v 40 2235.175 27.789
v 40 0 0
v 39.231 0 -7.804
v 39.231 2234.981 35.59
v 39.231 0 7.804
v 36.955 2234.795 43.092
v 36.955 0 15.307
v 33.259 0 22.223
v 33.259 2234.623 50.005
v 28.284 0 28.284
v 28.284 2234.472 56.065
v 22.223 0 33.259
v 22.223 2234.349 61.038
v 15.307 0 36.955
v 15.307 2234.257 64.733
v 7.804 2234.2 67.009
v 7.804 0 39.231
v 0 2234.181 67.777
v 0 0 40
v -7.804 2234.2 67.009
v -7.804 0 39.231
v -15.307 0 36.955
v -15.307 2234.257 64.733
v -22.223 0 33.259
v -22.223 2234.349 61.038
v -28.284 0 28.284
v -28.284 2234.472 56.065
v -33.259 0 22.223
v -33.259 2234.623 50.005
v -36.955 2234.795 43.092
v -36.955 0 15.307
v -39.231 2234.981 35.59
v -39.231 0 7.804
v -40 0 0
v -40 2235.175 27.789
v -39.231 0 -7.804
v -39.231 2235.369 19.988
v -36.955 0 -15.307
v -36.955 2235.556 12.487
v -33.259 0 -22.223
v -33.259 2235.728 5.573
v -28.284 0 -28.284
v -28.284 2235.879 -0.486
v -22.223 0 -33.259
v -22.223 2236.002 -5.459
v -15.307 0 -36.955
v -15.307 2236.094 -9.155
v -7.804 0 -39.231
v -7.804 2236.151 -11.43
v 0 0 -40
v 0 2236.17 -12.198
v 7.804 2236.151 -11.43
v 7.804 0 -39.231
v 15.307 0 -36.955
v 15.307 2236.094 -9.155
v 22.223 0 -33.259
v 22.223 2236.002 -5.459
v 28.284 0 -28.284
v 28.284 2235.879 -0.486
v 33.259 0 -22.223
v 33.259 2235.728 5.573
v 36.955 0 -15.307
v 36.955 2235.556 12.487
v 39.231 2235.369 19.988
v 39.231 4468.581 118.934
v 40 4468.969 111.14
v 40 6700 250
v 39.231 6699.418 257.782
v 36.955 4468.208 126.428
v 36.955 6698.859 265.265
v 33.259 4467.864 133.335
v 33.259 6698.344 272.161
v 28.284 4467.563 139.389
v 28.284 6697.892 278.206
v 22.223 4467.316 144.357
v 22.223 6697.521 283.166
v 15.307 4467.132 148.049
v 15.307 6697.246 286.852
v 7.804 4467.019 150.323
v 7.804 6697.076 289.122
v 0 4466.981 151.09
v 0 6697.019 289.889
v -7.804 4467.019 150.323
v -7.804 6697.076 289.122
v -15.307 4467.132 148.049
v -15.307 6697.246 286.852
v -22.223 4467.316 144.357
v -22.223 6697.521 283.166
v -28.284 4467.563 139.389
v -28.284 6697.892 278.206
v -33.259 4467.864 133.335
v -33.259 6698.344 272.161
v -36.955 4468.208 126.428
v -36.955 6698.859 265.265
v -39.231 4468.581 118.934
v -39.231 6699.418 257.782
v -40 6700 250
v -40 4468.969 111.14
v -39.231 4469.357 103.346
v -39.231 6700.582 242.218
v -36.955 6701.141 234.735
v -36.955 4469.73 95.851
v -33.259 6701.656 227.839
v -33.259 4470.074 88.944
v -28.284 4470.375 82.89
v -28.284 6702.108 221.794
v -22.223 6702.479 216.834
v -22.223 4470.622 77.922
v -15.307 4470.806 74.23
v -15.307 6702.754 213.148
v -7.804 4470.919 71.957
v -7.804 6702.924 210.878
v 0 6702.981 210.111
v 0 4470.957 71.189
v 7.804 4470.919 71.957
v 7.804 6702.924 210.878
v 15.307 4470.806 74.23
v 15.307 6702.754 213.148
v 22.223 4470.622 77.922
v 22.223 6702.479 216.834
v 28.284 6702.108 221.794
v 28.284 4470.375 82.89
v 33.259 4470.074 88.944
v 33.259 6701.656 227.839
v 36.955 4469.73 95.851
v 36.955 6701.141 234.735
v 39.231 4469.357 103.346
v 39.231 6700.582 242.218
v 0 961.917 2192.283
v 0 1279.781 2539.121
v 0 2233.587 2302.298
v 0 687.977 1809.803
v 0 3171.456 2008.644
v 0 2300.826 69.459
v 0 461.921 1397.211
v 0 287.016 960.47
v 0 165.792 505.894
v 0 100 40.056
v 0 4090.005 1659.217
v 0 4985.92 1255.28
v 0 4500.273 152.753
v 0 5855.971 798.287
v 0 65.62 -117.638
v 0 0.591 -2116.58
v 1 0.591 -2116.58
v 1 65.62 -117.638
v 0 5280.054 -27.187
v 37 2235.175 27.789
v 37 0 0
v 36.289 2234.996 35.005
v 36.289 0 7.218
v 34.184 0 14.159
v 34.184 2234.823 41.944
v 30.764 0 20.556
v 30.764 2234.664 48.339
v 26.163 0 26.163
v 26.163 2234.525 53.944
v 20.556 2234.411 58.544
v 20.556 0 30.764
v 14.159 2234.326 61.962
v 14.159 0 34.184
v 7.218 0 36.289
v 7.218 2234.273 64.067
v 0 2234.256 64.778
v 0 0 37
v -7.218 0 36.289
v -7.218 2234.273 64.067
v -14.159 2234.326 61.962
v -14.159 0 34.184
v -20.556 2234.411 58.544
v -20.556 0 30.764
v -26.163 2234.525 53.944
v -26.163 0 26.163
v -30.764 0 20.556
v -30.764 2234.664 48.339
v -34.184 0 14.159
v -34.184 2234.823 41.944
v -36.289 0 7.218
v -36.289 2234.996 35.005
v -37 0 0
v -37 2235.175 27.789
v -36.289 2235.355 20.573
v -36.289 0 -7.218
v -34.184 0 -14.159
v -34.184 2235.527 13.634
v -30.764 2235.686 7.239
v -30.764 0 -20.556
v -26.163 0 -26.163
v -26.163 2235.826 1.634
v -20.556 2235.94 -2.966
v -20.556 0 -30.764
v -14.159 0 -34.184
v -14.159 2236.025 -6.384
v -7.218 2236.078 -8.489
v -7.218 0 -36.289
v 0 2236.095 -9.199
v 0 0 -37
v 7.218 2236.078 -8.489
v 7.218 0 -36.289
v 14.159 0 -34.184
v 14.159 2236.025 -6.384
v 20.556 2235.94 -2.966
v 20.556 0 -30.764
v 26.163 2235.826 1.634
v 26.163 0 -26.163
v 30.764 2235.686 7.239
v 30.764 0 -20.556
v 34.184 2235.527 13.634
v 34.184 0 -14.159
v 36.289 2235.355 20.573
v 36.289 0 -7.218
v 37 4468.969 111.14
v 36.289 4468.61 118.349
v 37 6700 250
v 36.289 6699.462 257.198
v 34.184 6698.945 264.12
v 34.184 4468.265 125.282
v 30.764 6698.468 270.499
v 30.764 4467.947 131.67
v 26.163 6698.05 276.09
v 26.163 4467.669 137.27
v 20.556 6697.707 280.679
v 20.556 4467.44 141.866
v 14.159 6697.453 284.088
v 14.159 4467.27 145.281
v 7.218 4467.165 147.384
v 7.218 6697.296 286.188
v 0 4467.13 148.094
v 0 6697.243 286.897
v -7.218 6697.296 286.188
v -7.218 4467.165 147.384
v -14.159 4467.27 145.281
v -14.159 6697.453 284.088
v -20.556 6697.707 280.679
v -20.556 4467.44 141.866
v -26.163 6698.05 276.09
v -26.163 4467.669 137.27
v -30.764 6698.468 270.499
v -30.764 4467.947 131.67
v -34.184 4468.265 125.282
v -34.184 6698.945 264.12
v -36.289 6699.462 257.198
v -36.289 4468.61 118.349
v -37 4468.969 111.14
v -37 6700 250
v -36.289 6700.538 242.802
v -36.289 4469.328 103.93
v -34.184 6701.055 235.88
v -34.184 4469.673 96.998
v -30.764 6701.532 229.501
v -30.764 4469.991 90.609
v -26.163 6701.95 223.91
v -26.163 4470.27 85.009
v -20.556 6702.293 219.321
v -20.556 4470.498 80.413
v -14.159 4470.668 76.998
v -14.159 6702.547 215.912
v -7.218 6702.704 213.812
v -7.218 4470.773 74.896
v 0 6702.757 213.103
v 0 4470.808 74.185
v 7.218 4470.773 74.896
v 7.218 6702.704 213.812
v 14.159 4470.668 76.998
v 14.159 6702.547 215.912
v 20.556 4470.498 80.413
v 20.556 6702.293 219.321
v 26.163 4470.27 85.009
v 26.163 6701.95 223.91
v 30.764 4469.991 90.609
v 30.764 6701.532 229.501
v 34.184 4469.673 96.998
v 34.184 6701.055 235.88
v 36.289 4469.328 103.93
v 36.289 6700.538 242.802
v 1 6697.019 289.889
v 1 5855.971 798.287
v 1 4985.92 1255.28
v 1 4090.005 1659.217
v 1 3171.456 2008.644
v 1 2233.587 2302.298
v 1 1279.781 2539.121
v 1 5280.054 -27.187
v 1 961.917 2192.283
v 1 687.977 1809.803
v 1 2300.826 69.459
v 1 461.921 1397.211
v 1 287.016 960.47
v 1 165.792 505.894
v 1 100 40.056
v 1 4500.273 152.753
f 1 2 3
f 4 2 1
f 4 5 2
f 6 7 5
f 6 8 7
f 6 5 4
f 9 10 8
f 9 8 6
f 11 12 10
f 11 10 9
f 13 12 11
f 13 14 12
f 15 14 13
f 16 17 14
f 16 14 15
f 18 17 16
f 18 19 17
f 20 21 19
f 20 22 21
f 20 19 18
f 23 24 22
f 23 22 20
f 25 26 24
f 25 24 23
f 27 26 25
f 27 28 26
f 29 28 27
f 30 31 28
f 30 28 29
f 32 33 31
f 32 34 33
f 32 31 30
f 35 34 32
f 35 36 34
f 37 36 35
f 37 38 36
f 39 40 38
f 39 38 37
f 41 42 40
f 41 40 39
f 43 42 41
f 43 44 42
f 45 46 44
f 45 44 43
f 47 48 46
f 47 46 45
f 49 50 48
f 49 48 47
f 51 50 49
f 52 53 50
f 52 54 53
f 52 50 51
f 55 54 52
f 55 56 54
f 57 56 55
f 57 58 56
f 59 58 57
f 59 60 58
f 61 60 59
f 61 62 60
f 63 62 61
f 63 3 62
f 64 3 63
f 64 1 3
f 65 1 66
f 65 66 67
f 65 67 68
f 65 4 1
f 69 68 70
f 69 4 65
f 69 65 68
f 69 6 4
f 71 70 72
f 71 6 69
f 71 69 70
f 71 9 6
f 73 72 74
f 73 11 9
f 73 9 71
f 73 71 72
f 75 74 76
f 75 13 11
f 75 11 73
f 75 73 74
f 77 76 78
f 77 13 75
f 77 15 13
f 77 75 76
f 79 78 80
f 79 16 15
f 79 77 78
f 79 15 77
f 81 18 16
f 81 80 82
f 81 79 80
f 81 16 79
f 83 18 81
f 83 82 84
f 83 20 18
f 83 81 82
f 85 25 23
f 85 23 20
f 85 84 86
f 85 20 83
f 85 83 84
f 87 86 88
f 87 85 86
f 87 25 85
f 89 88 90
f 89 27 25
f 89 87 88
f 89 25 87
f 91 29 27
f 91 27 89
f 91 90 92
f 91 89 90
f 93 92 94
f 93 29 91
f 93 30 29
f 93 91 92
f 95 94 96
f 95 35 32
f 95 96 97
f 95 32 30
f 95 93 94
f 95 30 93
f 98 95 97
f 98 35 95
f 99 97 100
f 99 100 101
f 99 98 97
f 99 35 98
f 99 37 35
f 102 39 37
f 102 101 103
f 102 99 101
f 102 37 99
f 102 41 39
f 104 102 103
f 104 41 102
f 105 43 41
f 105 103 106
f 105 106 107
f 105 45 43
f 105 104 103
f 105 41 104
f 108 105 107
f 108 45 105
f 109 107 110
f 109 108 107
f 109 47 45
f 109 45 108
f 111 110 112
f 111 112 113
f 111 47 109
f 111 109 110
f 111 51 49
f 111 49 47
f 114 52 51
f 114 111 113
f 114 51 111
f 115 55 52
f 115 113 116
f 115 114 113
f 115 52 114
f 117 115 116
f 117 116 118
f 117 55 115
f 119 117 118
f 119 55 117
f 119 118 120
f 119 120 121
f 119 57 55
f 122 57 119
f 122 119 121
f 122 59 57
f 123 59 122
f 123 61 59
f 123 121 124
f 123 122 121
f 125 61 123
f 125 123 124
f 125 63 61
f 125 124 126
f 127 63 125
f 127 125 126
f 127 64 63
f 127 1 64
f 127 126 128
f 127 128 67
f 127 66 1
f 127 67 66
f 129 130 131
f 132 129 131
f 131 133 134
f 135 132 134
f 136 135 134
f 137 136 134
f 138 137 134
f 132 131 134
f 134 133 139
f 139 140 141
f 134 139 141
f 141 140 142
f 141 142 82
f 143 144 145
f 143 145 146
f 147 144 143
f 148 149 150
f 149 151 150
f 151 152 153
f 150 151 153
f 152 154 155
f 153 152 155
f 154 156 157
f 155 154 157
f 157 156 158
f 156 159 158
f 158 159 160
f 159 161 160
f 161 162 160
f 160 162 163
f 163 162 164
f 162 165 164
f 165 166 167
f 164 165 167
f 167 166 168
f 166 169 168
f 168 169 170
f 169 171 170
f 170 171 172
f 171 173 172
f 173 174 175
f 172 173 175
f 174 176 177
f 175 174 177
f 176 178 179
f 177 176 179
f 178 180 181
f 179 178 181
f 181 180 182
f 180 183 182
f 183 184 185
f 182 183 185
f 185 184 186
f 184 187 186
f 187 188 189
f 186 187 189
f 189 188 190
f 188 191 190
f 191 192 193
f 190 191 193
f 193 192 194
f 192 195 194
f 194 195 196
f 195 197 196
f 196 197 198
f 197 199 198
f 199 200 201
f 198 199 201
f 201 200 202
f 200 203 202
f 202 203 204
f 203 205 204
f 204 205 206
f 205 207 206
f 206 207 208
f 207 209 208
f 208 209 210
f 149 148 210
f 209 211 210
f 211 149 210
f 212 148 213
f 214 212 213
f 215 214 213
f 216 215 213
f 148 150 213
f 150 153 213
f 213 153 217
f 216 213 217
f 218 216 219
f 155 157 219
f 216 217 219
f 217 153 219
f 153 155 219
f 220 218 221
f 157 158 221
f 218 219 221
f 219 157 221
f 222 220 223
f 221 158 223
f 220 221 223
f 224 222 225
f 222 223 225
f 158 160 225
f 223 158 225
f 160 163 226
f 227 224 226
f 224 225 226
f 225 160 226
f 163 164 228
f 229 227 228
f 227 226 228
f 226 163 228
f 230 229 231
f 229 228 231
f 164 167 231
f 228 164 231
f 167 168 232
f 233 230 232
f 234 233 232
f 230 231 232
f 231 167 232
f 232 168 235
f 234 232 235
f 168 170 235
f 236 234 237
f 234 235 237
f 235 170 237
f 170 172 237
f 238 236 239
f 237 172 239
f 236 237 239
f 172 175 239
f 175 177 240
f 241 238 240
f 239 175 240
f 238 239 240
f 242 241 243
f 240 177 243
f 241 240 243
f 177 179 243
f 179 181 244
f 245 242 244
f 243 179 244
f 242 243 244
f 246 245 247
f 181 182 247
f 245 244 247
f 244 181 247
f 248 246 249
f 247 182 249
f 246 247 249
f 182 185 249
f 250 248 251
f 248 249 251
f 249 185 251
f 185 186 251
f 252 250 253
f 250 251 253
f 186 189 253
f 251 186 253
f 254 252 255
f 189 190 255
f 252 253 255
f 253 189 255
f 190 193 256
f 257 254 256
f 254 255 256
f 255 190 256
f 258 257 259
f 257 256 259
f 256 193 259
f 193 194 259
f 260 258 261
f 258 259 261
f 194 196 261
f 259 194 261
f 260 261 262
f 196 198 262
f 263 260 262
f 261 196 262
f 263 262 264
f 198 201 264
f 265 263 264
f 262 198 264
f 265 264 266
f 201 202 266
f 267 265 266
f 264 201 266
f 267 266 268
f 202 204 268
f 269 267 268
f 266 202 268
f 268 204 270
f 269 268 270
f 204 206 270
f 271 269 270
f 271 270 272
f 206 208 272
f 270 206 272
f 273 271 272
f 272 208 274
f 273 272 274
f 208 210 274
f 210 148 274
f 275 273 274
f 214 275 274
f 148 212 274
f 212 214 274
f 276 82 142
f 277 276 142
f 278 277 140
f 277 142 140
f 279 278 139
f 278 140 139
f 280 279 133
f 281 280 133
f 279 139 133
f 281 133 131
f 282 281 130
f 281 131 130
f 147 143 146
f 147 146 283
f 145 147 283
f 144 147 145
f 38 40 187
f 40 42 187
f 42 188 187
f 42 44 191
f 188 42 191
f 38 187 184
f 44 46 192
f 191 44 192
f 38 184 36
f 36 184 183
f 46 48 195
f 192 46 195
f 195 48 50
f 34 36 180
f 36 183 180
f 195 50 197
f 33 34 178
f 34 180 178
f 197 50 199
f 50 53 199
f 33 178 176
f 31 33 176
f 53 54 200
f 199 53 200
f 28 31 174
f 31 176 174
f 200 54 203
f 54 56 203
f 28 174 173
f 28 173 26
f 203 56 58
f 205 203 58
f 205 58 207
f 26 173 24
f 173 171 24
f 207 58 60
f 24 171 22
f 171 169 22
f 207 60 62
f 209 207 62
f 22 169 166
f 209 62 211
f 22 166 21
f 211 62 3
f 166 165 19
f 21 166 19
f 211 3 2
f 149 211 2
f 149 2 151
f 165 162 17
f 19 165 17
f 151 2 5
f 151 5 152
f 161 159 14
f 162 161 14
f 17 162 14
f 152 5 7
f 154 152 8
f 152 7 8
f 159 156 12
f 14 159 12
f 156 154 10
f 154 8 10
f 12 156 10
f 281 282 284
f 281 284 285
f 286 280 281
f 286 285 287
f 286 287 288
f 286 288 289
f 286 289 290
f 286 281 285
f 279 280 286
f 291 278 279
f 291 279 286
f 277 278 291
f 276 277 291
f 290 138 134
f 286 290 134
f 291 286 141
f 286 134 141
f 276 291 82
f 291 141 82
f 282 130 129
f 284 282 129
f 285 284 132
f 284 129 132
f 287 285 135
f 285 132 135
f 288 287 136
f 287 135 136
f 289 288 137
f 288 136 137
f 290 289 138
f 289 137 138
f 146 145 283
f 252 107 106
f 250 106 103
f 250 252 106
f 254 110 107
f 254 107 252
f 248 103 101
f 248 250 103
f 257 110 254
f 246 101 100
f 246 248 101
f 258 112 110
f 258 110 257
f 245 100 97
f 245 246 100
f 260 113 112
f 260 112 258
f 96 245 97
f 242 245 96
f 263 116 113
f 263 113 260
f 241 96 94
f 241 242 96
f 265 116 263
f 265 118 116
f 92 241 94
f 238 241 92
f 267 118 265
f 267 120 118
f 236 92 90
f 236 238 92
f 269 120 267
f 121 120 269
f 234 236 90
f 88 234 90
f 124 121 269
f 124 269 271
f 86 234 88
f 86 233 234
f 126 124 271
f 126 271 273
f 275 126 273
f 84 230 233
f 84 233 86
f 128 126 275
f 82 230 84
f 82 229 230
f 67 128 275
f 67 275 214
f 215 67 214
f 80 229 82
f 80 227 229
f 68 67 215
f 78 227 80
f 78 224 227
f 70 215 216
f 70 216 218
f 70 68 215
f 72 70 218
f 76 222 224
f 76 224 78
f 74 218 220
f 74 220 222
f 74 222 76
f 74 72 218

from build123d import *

# Parameters (mm, degrees)
SKETCH_1_R        = 40
SKETCH_1_R_2      = 37
EXTRUDE_1_DEPTH   = 1
EXTRUDE_1_2_DEPTH = 1


with BuildPart() as part:
    # По траектории-Тонкостенный1: sweep along a path in Эскиз3
    with BuildLine(Plane(origin=(0, 0, 0), x_dir=(0, 0, -1), z_dir=(1, 0, 0))) as sweep_1_path:
        ThreePointArc((0, 0), (-62.521739436, 3352.331278379), (-250, 6700))
    # Эскиз1 → По траектории-Тонкостенный1 (sweep)
    with BuildSketch(Plane(origin=(0, 0, 0), x_dir=(1, 0, 0), z_dir=(0, 1, 0))):
        Circle(SKETCH_1_R)
        Circle(SKETCH_1_R_2, mode=Mode.SUBTRACT)
    sweep(path=sweep_1_path.line)


with BuildPart() as body_2:
    # Эскиз4 → Бобышка-Вытянуть1 (new body)
    with BuildSketch(Plane(origin=(0, 0, 0), x_dir=(0, 0, -1), z_dir=(1, 0, 0))):
        Polygon((27.186992612, 5280.053707105), (2116.58019703, 0.591107293), (117.637669058, 65.620099767), align=None)
    extrude(amount=EXTRUDE_1_DEPTH)


with BuildPart() as body_3:
    # Эскиз4 → Extrude 1 2 (new body)
    with BuildSketch(Plane(origin=(0, 0, 0), x_dir=(0, 0, -1), z_dir=(1, 0, 0))):
        with BuildLine():
            ThreePointArc((-40.055639031, 100), (-104.372197224, 3400.804497078), (-289.888771481, 6697.019075691))
            ThreePointArc((-289.888771481, 6697.019075691), (-1659.217455567, 4090.004624299), (-2539.121344337, 1279.781405166))
            ThreePointArc((-2539.121344337, 1279.781405166), (-1397.210671567, 461.92059075), (-40.055639031, 100))
        make_face()
    extrude(amount=EXTRUDE_1_2_DEPTH)


solid = Compound([part.part, body_2.part, body_3.part])
